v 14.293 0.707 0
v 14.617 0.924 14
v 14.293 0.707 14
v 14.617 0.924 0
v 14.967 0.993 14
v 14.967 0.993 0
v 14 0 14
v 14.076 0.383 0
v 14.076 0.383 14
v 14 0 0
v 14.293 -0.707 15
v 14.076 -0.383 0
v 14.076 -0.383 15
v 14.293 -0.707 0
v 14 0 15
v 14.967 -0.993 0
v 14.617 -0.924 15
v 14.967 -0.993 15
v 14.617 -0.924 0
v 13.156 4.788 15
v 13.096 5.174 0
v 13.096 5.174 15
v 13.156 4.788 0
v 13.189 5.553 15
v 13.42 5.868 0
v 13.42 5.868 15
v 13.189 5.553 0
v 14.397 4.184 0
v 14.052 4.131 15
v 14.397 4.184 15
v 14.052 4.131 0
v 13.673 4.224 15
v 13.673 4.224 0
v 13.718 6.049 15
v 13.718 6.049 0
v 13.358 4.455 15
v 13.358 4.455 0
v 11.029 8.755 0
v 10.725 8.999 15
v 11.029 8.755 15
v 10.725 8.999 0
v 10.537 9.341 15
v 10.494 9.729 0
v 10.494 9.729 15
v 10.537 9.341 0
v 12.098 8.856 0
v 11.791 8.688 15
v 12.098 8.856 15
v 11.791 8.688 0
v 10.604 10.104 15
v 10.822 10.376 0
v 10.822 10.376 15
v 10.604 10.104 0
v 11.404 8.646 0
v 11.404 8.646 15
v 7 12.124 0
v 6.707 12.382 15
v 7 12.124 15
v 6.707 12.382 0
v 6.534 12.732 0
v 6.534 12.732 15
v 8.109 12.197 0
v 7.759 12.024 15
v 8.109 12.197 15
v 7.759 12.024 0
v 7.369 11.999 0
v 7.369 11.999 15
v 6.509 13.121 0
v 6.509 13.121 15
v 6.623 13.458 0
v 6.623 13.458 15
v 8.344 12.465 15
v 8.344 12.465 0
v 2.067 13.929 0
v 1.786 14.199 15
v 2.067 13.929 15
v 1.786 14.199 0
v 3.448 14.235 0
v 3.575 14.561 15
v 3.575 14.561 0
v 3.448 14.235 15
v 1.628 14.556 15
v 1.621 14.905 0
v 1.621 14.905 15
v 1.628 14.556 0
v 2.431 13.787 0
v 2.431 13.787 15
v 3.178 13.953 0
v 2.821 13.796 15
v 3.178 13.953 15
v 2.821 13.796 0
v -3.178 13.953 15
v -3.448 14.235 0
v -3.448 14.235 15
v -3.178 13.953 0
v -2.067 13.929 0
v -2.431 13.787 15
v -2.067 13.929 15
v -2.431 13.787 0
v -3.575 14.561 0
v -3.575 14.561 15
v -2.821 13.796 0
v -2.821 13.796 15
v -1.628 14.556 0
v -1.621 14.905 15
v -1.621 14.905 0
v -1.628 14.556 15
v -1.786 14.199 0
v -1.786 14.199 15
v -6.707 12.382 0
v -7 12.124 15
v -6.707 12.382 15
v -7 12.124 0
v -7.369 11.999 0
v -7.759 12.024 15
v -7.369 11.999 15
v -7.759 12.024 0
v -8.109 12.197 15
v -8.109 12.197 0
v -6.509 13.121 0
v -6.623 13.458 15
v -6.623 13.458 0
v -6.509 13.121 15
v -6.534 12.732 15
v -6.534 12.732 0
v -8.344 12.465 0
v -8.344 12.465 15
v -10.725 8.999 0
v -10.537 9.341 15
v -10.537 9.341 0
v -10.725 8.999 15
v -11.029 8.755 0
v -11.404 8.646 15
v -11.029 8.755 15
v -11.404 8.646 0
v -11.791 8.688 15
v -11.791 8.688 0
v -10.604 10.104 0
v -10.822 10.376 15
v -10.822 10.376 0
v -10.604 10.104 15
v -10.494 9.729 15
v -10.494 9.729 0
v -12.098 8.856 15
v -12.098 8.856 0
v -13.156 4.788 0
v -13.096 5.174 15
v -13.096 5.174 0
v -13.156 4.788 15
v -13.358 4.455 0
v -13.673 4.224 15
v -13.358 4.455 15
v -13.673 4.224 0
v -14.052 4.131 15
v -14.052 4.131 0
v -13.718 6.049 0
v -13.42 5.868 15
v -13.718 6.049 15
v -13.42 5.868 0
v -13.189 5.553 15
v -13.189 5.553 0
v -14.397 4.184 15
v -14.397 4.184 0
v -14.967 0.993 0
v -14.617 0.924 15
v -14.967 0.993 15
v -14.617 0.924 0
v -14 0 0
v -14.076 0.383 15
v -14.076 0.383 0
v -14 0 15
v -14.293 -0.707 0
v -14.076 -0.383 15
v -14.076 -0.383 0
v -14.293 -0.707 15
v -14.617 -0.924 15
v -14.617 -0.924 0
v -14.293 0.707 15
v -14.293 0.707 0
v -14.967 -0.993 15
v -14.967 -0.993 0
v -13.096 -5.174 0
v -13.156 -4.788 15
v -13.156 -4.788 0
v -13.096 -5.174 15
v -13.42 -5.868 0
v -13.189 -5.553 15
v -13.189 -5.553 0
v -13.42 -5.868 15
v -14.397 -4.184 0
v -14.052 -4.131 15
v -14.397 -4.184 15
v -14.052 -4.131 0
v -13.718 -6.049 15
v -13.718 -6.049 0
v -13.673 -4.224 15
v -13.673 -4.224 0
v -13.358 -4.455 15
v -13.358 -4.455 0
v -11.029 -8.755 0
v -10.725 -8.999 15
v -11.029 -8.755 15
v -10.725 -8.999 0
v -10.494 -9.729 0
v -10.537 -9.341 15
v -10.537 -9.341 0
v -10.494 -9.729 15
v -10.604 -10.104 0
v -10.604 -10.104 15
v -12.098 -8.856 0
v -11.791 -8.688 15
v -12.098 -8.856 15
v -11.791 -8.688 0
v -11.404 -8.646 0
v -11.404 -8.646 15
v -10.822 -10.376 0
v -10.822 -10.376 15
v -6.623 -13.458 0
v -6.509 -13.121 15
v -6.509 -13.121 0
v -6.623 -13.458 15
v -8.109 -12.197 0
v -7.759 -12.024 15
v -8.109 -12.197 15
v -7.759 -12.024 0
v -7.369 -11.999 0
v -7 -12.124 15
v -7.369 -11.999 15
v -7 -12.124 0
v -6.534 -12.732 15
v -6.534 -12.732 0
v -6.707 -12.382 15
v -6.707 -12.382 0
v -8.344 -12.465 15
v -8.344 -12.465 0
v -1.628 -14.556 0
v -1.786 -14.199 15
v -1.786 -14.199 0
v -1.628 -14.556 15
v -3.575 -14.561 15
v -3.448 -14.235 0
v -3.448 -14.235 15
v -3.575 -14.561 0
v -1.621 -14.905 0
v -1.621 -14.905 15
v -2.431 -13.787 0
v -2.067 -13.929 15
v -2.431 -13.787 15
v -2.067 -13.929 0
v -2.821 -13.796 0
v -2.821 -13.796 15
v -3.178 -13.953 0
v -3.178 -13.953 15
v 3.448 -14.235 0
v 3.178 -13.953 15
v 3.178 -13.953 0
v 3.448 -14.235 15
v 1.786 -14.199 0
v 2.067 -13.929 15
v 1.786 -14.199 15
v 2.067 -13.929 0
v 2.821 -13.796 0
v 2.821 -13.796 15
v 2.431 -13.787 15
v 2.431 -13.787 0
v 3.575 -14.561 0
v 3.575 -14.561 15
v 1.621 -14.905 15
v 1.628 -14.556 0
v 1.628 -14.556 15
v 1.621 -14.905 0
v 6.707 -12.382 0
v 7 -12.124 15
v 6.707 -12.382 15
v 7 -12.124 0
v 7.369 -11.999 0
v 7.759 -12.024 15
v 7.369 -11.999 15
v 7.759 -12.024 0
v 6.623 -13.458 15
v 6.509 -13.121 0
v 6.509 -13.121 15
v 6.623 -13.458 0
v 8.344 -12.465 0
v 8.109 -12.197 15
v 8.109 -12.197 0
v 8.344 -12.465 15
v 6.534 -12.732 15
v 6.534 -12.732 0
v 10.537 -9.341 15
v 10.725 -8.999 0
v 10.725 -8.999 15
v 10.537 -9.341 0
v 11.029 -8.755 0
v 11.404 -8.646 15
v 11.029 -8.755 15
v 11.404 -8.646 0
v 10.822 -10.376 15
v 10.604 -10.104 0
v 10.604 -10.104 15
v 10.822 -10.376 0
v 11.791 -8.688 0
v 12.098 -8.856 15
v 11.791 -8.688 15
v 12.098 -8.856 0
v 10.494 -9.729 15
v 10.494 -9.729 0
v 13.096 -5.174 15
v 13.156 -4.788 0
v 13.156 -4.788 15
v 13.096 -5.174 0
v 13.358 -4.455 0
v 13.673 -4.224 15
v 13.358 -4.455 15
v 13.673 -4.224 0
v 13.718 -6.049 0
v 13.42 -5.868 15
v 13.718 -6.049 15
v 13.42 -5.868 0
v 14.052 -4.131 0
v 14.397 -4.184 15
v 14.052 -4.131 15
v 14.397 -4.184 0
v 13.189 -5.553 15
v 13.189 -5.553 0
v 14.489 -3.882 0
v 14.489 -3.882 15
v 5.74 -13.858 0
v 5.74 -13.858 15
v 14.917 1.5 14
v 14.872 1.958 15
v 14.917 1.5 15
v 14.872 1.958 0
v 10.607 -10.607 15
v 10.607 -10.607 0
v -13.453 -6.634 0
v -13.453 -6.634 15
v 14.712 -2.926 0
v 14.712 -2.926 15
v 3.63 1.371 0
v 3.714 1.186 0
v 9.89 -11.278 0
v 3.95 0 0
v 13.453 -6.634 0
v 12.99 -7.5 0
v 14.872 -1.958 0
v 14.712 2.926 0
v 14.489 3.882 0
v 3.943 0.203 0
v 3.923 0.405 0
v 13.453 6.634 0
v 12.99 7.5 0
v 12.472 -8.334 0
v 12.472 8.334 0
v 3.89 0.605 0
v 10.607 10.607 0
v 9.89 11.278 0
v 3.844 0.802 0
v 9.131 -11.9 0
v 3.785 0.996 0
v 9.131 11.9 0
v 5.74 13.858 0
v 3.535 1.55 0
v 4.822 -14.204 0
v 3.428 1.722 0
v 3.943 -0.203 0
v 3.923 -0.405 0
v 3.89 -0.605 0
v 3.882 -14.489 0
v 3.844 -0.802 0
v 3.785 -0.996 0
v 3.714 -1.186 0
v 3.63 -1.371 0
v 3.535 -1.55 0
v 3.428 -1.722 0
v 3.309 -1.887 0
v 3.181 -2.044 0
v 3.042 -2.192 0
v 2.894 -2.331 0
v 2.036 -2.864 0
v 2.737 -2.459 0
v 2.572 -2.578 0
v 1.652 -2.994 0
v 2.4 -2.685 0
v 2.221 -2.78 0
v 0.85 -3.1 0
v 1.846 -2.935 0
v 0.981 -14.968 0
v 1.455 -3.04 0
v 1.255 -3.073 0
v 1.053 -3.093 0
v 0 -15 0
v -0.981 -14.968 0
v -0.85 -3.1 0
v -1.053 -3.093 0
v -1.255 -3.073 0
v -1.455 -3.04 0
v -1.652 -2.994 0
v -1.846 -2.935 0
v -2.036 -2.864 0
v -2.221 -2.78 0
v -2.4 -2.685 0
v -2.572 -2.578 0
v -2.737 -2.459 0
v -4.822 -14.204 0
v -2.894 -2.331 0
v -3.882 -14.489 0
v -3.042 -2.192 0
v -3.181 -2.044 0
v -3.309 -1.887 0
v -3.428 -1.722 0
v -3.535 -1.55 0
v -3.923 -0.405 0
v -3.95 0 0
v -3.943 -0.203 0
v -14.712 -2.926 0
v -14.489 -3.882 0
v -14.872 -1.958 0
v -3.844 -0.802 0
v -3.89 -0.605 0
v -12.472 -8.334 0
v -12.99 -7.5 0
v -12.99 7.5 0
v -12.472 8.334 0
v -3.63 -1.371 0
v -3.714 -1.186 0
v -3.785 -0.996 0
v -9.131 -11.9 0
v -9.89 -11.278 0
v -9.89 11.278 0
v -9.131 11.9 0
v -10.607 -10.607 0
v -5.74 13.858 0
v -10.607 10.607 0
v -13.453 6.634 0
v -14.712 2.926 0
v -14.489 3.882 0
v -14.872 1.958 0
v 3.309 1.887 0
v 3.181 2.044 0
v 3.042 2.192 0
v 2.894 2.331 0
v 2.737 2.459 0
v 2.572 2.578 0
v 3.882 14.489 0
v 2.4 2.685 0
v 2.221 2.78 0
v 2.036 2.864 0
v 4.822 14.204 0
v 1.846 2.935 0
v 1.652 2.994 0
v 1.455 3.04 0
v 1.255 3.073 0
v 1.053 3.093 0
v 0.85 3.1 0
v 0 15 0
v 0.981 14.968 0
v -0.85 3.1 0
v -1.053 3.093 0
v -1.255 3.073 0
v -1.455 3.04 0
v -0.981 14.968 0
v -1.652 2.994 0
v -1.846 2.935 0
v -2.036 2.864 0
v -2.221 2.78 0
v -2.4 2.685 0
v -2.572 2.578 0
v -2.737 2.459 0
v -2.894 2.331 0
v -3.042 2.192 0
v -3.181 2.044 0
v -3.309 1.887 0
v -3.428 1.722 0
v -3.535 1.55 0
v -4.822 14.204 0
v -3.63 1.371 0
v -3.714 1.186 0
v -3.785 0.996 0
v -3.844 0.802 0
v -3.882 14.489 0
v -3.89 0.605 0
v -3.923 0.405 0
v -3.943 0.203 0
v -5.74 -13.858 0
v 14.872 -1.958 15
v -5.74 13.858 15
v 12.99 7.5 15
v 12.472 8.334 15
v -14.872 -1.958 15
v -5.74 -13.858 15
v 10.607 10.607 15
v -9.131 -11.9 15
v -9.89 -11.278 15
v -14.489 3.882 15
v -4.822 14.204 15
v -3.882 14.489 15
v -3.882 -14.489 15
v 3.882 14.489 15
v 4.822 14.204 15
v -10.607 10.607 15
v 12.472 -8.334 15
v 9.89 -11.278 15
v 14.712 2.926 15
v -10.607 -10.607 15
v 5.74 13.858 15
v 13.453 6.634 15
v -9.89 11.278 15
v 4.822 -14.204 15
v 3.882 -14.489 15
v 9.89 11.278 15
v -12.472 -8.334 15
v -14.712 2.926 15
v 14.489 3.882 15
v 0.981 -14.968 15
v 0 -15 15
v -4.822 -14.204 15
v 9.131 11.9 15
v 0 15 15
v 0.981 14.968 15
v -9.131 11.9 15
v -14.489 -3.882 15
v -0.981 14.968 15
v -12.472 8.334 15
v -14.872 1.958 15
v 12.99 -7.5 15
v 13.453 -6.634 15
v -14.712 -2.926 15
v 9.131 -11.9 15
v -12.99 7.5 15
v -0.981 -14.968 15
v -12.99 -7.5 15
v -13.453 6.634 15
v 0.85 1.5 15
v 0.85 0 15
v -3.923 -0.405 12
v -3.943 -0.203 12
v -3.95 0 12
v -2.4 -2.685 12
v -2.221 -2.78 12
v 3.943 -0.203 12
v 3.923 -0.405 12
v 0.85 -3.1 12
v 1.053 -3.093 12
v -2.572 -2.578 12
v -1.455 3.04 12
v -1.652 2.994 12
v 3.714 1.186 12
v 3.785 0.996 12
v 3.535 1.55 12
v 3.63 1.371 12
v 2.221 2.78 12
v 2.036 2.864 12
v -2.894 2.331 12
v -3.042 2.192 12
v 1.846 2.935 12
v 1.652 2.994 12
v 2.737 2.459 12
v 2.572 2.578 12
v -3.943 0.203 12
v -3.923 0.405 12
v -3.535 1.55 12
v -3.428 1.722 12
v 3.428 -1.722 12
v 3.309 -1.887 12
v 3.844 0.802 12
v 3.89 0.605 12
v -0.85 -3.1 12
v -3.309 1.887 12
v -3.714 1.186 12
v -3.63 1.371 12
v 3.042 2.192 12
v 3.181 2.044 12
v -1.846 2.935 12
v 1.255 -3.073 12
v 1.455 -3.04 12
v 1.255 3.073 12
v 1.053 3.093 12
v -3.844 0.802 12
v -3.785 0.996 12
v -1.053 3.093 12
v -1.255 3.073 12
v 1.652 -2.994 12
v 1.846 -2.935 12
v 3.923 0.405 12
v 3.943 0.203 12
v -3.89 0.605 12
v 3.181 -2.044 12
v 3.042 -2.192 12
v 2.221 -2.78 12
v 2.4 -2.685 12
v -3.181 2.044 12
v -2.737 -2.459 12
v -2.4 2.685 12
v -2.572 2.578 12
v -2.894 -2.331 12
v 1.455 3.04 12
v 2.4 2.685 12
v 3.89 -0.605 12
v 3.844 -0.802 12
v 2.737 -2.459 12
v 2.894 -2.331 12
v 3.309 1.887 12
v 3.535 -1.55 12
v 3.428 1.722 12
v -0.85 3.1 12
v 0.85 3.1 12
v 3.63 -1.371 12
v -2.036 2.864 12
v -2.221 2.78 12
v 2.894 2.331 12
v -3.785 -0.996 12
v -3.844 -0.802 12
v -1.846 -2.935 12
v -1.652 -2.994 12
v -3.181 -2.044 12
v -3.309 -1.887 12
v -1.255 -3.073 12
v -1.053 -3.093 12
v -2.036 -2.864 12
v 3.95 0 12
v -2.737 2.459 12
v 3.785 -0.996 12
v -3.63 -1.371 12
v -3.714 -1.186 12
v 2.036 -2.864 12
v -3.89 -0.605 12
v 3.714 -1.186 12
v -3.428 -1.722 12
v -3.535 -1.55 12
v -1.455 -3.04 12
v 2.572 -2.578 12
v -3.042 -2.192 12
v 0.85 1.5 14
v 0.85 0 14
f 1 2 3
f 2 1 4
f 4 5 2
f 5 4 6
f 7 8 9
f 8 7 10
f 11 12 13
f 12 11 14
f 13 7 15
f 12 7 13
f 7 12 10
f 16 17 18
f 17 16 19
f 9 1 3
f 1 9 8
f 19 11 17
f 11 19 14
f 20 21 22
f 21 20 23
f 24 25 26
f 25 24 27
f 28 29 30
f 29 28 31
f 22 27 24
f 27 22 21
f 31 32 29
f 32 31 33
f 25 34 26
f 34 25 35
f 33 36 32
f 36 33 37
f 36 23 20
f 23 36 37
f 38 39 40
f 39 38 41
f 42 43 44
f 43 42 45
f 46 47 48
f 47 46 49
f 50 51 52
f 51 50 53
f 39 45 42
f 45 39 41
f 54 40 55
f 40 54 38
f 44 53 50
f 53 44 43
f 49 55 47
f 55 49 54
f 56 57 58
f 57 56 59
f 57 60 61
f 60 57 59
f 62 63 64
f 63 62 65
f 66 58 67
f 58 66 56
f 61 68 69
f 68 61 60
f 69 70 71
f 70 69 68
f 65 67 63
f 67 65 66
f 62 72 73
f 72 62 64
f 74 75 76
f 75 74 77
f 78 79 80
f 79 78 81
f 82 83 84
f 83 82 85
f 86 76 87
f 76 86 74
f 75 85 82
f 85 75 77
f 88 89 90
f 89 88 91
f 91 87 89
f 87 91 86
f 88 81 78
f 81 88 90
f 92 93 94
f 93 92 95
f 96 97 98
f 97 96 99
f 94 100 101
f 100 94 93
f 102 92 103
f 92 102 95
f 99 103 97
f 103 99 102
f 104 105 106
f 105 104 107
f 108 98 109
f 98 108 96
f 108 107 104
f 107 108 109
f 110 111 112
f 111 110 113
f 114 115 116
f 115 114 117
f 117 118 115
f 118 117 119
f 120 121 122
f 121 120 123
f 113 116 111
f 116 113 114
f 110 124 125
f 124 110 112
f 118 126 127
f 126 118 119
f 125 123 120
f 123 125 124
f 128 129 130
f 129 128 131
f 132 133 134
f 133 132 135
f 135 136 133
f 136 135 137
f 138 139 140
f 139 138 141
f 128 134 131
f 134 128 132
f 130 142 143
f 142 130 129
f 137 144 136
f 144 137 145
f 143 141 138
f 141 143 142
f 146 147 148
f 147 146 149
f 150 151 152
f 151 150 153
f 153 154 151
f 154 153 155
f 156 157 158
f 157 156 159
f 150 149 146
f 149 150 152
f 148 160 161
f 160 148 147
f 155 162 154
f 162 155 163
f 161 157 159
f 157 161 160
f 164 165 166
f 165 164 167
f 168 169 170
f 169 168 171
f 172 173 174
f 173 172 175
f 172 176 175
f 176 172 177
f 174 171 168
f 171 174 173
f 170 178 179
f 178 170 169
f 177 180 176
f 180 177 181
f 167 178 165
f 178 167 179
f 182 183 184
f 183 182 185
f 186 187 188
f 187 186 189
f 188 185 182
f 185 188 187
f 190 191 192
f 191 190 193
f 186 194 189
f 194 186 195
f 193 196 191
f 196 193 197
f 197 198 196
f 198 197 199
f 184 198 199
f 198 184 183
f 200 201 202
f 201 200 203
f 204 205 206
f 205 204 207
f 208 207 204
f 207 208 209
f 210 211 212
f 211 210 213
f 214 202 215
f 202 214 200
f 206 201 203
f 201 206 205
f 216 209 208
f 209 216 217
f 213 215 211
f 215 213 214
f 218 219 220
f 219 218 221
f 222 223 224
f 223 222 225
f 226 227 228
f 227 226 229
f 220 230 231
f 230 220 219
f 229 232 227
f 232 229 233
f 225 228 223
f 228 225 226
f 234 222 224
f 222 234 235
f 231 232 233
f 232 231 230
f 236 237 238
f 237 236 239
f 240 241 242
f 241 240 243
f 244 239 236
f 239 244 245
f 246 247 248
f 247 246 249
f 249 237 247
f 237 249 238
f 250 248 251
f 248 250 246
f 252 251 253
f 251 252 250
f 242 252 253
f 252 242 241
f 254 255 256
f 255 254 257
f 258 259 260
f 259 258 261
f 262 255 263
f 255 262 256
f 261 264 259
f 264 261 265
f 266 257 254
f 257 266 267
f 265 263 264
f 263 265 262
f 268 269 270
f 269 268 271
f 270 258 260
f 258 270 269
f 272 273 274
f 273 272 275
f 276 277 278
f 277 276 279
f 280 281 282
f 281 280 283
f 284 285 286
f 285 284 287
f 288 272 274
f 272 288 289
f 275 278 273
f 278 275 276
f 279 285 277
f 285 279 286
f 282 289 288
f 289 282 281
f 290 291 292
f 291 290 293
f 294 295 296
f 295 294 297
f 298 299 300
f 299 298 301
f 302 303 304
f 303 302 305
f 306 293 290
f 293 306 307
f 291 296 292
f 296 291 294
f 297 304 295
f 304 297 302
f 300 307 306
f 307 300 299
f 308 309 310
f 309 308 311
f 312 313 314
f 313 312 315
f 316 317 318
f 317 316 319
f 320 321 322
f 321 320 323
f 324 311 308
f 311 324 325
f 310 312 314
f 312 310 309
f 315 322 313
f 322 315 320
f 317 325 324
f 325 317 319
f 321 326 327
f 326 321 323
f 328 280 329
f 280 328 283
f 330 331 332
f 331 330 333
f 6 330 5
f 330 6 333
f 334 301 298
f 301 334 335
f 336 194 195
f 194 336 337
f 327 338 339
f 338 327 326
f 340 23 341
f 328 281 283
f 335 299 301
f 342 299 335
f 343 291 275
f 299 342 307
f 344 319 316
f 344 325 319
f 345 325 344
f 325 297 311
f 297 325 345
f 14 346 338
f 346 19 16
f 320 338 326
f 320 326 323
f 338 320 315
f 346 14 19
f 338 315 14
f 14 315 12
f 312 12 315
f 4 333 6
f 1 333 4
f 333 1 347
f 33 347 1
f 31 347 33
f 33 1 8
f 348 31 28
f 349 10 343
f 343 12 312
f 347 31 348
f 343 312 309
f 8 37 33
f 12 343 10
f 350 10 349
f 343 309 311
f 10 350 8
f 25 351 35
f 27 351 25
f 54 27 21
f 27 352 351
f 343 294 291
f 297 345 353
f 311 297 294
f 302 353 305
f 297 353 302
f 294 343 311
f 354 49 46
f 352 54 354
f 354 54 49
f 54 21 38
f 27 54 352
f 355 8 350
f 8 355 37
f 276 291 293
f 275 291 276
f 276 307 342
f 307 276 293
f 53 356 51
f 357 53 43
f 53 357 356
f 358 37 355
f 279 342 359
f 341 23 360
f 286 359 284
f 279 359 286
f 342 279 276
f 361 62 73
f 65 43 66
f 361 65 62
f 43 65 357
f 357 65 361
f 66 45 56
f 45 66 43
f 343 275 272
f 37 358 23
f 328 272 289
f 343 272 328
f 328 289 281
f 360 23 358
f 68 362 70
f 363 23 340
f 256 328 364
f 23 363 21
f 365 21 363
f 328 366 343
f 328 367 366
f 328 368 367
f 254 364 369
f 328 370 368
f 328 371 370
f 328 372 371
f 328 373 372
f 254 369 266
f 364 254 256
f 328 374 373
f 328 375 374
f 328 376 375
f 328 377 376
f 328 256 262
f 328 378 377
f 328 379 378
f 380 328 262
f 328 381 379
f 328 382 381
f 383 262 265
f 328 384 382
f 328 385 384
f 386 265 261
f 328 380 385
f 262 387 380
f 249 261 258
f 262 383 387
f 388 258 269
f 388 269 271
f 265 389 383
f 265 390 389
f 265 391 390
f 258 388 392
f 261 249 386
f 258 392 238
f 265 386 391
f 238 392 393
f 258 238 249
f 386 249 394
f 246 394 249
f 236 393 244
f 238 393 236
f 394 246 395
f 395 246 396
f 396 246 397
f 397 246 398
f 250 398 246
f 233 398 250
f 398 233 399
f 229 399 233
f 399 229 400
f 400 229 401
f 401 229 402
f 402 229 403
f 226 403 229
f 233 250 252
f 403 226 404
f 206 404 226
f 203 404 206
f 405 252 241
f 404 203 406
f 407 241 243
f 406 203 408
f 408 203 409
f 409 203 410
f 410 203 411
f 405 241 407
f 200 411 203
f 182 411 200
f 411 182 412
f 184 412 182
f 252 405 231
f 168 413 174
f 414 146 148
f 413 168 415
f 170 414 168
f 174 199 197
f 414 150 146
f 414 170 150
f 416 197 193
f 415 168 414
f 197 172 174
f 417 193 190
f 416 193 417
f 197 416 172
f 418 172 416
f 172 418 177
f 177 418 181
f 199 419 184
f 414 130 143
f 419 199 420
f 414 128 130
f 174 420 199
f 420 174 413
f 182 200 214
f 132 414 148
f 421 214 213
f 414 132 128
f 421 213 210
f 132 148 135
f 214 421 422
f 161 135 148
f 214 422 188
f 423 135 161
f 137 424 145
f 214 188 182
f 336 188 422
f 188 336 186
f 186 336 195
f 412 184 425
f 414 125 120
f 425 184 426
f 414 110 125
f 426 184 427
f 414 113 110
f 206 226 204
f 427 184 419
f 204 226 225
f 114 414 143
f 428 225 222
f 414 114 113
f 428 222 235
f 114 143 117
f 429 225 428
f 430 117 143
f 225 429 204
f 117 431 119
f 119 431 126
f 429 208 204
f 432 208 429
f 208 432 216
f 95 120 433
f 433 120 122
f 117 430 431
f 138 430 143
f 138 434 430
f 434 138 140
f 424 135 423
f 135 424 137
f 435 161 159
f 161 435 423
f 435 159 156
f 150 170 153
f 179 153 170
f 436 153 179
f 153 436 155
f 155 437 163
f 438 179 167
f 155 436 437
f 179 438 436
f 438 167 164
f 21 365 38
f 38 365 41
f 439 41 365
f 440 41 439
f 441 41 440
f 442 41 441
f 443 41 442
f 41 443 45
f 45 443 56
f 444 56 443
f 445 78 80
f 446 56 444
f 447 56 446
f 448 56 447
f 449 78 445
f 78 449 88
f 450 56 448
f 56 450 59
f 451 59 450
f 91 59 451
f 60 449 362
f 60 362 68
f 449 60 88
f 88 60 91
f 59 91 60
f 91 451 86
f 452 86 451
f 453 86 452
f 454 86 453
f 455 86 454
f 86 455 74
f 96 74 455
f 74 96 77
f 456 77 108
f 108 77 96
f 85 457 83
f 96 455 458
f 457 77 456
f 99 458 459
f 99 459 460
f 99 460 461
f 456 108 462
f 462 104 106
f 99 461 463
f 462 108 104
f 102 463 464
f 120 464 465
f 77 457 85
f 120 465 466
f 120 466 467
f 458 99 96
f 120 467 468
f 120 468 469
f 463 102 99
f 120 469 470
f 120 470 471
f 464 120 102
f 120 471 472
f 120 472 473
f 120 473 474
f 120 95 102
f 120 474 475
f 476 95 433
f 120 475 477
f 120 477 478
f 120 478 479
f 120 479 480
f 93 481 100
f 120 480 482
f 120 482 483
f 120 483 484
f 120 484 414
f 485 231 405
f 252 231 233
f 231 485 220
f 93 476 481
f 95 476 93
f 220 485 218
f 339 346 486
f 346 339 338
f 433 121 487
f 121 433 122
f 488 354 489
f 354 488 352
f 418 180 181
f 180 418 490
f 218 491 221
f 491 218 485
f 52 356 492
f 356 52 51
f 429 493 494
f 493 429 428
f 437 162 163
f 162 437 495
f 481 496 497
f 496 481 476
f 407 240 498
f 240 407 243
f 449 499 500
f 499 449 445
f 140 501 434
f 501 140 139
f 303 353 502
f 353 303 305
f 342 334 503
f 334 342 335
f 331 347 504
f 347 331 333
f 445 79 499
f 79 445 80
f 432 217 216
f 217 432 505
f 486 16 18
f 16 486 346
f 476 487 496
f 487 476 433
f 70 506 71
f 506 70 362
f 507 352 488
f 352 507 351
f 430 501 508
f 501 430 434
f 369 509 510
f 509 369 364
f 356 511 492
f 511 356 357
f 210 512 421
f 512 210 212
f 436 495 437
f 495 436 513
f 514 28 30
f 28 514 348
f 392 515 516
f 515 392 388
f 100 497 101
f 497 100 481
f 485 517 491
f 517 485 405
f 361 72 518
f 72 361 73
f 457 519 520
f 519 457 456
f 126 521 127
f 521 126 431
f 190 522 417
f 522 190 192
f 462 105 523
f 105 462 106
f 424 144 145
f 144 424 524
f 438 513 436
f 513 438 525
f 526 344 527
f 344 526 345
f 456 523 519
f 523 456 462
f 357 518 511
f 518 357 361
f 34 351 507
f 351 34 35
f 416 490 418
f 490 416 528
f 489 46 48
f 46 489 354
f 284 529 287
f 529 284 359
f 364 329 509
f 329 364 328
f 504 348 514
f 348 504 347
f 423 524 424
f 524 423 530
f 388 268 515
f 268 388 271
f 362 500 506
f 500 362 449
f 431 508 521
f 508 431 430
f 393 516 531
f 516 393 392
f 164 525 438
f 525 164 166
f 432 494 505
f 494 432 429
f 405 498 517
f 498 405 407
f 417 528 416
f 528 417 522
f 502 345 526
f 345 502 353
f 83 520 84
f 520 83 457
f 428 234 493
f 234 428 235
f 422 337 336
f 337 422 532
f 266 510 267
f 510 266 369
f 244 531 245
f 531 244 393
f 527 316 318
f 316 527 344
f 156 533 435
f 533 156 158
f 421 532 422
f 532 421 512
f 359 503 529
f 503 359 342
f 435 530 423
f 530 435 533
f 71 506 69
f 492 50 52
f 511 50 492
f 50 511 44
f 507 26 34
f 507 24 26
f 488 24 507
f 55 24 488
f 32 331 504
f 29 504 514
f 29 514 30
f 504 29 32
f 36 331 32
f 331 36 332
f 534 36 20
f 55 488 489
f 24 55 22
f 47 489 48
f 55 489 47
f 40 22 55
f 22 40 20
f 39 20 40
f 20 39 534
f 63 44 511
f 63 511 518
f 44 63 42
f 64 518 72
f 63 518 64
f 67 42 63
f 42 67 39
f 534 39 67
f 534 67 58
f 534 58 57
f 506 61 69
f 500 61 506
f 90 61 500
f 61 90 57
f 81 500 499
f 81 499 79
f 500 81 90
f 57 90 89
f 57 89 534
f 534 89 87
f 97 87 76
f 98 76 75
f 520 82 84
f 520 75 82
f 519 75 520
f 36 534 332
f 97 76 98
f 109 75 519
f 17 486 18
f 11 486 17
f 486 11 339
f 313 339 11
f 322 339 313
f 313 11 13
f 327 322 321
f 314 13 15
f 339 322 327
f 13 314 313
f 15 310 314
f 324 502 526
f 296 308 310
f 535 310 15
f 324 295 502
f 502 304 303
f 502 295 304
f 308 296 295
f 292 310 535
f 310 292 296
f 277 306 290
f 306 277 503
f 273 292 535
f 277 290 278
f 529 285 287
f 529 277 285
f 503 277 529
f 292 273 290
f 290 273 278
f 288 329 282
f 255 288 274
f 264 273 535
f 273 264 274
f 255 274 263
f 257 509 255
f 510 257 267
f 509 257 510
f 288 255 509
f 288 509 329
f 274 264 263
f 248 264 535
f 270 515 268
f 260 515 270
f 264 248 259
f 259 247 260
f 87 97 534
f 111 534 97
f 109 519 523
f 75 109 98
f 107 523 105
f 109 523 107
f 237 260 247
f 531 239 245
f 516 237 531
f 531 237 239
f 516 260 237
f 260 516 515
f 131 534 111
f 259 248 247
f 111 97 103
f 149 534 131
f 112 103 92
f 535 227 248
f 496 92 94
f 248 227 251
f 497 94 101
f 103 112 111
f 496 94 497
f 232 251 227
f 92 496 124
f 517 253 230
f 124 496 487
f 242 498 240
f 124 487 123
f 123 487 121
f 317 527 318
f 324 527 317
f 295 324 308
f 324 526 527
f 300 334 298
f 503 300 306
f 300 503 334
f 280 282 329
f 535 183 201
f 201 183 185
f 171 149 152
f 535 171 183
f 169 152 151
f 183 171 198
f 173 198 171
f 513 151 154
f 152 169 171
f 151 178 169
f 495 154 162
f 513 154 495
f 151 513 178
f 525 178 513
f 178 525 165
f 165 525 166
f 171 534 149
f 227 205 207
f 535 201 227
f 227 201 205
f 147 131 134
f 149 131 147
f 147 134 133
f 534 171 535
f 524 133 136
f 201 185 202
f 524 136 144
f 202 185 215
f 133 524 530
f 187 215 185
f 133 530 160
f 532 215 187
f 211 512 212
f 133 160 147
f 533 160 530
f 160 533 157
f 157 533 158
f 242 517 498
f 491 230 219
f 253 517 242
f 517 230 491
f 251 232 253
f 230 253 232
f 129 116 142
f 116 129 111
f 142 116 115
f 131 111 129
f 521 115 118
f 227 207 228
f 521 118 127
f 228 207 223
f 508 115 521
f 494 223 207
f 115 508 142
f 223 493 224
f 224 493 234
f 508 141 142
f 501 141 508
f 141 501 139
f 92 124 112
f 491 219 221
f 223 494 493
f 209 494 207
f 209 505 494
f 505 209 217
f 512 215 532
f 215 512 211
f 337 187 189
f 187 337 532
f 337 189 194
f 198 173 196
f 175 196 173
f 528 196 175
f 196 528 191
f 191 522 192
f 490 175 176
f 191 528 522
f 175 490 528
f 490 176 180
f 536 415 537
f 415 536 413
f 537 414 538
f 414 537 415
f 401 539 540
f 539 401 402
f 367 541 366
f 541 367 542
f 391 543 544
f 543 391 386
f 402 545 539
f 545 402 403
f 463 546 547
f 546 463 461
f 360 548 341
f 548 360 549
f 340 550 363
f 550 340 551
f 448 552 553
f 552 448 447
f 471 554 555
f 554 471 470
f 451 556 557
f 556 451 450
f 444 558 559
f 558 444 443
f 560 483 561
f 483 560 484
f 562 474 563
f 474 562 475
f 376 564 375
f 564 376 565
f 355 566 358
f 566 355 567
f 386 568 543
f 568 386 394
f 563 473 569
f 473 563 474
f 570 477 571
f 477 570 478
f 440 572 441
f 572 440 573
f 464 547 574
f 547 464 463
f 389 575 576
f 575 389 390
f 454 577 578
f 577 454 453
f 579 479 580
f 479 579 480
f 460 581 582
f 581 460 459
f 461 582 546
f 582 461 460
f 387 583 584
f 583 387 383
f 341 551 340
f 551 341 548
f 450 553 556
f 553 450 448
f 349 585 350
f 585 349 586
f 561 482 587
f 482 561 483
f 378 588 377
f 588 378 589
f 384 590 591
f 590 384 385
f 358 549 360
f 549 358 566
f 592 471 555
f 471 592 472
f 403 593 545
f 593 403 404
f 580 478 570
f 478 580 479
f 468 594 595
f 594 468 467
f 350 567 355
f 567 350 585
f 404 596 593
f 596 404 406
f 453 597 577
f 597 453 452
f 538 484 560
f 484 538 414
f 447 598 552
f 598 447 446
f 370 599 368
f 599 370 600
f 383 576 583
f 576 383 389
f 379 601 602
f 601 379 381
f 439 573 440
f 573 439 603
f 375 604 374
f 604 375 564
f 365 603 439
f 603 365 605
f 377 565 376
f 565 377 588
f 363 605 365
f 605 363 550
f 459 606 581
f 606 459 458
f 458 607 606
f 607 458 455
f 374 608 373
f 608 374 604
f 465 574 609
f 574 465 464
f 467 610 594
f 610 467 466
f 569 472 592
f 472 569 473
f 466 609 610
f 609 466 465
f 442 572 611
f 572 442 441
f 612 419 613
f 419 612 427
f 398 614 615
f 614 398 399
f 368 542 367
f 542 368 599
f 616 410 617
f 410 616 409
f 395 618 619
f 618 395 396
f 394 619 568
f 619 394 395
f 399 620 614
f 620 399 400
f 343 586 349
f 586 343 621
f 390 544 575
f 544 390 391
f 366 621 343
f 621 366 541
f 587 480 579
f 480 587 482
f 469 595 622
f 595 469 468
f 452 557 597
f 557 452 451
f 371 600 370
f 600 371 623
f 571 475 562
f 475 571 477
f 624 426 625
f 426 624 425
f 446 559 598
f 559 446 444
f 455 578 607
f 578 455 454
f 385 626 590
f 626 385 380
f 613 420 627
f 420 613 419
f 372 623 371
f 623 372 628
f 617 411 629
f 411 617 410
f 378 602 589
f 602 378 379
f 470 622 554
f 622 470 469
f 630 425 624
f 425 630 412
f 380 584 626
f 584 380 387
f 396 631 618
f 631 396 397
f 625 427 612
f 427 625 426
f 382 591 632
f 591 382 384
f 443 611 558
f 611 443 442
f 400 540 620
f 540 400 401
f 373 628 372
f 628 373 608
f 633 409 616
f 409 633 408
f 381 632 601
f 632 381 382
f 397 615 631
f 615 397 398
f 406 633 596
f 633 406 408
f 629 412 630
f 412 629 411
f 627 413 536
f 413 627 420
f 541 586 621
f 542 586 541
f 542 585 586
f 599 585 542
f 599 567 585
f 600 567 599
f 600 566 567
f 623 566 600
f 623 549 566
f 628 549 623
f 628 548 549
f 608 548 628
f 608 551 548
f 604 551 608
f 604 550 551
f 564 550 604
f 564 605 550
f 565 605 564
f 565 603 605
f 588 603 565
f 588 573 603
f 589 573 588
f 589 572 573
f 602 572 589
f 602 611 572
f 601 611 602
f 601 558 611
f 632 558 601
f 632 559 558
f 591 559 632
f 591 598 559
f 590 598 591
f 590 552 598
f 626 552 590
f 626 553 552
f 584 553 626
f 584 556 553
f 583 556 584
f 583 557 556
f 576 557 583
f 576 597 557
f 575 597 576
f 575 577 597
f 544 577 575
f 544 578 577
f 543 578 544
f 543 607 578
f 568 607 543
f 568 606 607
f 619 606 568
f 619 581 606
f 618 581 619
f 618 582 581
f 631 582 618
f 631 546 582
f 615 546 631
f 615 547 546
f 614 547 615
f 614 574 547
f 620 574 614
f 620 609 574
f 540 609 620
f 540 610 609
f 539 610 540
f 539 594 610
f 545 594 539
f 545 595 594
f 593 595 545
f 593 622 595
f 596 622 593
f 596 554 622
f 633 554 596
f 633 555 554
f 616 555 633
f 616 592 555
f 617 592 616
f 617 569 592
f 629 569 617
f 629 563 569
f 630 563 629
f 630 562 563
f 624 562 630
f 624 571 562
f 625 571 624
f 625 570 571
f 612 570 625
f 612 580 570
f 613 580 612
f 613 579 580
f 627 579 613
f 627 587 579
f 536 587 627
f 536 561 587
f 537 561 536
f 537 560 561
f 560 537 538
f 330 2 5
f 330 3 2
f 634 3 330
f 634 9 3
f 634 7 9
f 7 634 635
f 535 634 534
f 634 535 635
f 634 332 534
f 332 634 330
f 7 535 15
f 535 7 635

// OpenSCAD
// Replacement knob for a hotplate stirrer with a 6 mm D-shaft
// Print orientation: bottom face (with shaft bore) on the bed, z = 0

$fn = 96;

// --- Knob dimensions ---
knob_d      = 30;    // knob diameter
knob_h      = 15;    // knob height

// --- Shaft bore ---
shaft_d     = 6.2;   // D-shaft bore diameter
shaft_depth = 12;    // blind bore depth from bottom face
flat_offset = 0.85;  // distance from flat side to circle centre (so flat-to-opposite side = 4.7)

// --- Grip grooves ---
groove_count = 18;   // number of vertical grip grooves
groove_d     = 2;    // groove diameter (half-cylinder)

// --- Pointer groove ---
pointer_w   = 1.5;   // pointer groove width
pointer_d   = 1;     // pointer groove depth

// --- Cutting overlap ---
eps = 0.5;           // extension past faces to avoid coplanar surfaces

difference() {
    // Main body
    cylinder(d = knob_d, h = knob_h);

    // D-shaped blind bore from bottom face
    translate([0, 0, -eps])
        linear_extrude(height = shaft_depth + eps)
            hull() {
                translate([flat_offset, 0, 0]) circle(d = shaft_d);
                translate([-flat_offset, 0, 0]) circle(d = shaft_d);
            }

    // Vertical grip grooves along full height, centred on outer surface
    for (i = [0 : groove_count - 1])
        rotate([0, 0, i * 360 / groove_count])
            translate([knob_d / 2, 0, -eps])
                cylinder(d = groove_d, h = knob_h + 2 * eps, $fn = 16);

    // Pointer groove from centre to outer edge on top face, same side as flat
    translate([flat_offset, 0, knob_h - pointer_d])
        cube([knob_d, pointer_w, pointer_d]);
}
